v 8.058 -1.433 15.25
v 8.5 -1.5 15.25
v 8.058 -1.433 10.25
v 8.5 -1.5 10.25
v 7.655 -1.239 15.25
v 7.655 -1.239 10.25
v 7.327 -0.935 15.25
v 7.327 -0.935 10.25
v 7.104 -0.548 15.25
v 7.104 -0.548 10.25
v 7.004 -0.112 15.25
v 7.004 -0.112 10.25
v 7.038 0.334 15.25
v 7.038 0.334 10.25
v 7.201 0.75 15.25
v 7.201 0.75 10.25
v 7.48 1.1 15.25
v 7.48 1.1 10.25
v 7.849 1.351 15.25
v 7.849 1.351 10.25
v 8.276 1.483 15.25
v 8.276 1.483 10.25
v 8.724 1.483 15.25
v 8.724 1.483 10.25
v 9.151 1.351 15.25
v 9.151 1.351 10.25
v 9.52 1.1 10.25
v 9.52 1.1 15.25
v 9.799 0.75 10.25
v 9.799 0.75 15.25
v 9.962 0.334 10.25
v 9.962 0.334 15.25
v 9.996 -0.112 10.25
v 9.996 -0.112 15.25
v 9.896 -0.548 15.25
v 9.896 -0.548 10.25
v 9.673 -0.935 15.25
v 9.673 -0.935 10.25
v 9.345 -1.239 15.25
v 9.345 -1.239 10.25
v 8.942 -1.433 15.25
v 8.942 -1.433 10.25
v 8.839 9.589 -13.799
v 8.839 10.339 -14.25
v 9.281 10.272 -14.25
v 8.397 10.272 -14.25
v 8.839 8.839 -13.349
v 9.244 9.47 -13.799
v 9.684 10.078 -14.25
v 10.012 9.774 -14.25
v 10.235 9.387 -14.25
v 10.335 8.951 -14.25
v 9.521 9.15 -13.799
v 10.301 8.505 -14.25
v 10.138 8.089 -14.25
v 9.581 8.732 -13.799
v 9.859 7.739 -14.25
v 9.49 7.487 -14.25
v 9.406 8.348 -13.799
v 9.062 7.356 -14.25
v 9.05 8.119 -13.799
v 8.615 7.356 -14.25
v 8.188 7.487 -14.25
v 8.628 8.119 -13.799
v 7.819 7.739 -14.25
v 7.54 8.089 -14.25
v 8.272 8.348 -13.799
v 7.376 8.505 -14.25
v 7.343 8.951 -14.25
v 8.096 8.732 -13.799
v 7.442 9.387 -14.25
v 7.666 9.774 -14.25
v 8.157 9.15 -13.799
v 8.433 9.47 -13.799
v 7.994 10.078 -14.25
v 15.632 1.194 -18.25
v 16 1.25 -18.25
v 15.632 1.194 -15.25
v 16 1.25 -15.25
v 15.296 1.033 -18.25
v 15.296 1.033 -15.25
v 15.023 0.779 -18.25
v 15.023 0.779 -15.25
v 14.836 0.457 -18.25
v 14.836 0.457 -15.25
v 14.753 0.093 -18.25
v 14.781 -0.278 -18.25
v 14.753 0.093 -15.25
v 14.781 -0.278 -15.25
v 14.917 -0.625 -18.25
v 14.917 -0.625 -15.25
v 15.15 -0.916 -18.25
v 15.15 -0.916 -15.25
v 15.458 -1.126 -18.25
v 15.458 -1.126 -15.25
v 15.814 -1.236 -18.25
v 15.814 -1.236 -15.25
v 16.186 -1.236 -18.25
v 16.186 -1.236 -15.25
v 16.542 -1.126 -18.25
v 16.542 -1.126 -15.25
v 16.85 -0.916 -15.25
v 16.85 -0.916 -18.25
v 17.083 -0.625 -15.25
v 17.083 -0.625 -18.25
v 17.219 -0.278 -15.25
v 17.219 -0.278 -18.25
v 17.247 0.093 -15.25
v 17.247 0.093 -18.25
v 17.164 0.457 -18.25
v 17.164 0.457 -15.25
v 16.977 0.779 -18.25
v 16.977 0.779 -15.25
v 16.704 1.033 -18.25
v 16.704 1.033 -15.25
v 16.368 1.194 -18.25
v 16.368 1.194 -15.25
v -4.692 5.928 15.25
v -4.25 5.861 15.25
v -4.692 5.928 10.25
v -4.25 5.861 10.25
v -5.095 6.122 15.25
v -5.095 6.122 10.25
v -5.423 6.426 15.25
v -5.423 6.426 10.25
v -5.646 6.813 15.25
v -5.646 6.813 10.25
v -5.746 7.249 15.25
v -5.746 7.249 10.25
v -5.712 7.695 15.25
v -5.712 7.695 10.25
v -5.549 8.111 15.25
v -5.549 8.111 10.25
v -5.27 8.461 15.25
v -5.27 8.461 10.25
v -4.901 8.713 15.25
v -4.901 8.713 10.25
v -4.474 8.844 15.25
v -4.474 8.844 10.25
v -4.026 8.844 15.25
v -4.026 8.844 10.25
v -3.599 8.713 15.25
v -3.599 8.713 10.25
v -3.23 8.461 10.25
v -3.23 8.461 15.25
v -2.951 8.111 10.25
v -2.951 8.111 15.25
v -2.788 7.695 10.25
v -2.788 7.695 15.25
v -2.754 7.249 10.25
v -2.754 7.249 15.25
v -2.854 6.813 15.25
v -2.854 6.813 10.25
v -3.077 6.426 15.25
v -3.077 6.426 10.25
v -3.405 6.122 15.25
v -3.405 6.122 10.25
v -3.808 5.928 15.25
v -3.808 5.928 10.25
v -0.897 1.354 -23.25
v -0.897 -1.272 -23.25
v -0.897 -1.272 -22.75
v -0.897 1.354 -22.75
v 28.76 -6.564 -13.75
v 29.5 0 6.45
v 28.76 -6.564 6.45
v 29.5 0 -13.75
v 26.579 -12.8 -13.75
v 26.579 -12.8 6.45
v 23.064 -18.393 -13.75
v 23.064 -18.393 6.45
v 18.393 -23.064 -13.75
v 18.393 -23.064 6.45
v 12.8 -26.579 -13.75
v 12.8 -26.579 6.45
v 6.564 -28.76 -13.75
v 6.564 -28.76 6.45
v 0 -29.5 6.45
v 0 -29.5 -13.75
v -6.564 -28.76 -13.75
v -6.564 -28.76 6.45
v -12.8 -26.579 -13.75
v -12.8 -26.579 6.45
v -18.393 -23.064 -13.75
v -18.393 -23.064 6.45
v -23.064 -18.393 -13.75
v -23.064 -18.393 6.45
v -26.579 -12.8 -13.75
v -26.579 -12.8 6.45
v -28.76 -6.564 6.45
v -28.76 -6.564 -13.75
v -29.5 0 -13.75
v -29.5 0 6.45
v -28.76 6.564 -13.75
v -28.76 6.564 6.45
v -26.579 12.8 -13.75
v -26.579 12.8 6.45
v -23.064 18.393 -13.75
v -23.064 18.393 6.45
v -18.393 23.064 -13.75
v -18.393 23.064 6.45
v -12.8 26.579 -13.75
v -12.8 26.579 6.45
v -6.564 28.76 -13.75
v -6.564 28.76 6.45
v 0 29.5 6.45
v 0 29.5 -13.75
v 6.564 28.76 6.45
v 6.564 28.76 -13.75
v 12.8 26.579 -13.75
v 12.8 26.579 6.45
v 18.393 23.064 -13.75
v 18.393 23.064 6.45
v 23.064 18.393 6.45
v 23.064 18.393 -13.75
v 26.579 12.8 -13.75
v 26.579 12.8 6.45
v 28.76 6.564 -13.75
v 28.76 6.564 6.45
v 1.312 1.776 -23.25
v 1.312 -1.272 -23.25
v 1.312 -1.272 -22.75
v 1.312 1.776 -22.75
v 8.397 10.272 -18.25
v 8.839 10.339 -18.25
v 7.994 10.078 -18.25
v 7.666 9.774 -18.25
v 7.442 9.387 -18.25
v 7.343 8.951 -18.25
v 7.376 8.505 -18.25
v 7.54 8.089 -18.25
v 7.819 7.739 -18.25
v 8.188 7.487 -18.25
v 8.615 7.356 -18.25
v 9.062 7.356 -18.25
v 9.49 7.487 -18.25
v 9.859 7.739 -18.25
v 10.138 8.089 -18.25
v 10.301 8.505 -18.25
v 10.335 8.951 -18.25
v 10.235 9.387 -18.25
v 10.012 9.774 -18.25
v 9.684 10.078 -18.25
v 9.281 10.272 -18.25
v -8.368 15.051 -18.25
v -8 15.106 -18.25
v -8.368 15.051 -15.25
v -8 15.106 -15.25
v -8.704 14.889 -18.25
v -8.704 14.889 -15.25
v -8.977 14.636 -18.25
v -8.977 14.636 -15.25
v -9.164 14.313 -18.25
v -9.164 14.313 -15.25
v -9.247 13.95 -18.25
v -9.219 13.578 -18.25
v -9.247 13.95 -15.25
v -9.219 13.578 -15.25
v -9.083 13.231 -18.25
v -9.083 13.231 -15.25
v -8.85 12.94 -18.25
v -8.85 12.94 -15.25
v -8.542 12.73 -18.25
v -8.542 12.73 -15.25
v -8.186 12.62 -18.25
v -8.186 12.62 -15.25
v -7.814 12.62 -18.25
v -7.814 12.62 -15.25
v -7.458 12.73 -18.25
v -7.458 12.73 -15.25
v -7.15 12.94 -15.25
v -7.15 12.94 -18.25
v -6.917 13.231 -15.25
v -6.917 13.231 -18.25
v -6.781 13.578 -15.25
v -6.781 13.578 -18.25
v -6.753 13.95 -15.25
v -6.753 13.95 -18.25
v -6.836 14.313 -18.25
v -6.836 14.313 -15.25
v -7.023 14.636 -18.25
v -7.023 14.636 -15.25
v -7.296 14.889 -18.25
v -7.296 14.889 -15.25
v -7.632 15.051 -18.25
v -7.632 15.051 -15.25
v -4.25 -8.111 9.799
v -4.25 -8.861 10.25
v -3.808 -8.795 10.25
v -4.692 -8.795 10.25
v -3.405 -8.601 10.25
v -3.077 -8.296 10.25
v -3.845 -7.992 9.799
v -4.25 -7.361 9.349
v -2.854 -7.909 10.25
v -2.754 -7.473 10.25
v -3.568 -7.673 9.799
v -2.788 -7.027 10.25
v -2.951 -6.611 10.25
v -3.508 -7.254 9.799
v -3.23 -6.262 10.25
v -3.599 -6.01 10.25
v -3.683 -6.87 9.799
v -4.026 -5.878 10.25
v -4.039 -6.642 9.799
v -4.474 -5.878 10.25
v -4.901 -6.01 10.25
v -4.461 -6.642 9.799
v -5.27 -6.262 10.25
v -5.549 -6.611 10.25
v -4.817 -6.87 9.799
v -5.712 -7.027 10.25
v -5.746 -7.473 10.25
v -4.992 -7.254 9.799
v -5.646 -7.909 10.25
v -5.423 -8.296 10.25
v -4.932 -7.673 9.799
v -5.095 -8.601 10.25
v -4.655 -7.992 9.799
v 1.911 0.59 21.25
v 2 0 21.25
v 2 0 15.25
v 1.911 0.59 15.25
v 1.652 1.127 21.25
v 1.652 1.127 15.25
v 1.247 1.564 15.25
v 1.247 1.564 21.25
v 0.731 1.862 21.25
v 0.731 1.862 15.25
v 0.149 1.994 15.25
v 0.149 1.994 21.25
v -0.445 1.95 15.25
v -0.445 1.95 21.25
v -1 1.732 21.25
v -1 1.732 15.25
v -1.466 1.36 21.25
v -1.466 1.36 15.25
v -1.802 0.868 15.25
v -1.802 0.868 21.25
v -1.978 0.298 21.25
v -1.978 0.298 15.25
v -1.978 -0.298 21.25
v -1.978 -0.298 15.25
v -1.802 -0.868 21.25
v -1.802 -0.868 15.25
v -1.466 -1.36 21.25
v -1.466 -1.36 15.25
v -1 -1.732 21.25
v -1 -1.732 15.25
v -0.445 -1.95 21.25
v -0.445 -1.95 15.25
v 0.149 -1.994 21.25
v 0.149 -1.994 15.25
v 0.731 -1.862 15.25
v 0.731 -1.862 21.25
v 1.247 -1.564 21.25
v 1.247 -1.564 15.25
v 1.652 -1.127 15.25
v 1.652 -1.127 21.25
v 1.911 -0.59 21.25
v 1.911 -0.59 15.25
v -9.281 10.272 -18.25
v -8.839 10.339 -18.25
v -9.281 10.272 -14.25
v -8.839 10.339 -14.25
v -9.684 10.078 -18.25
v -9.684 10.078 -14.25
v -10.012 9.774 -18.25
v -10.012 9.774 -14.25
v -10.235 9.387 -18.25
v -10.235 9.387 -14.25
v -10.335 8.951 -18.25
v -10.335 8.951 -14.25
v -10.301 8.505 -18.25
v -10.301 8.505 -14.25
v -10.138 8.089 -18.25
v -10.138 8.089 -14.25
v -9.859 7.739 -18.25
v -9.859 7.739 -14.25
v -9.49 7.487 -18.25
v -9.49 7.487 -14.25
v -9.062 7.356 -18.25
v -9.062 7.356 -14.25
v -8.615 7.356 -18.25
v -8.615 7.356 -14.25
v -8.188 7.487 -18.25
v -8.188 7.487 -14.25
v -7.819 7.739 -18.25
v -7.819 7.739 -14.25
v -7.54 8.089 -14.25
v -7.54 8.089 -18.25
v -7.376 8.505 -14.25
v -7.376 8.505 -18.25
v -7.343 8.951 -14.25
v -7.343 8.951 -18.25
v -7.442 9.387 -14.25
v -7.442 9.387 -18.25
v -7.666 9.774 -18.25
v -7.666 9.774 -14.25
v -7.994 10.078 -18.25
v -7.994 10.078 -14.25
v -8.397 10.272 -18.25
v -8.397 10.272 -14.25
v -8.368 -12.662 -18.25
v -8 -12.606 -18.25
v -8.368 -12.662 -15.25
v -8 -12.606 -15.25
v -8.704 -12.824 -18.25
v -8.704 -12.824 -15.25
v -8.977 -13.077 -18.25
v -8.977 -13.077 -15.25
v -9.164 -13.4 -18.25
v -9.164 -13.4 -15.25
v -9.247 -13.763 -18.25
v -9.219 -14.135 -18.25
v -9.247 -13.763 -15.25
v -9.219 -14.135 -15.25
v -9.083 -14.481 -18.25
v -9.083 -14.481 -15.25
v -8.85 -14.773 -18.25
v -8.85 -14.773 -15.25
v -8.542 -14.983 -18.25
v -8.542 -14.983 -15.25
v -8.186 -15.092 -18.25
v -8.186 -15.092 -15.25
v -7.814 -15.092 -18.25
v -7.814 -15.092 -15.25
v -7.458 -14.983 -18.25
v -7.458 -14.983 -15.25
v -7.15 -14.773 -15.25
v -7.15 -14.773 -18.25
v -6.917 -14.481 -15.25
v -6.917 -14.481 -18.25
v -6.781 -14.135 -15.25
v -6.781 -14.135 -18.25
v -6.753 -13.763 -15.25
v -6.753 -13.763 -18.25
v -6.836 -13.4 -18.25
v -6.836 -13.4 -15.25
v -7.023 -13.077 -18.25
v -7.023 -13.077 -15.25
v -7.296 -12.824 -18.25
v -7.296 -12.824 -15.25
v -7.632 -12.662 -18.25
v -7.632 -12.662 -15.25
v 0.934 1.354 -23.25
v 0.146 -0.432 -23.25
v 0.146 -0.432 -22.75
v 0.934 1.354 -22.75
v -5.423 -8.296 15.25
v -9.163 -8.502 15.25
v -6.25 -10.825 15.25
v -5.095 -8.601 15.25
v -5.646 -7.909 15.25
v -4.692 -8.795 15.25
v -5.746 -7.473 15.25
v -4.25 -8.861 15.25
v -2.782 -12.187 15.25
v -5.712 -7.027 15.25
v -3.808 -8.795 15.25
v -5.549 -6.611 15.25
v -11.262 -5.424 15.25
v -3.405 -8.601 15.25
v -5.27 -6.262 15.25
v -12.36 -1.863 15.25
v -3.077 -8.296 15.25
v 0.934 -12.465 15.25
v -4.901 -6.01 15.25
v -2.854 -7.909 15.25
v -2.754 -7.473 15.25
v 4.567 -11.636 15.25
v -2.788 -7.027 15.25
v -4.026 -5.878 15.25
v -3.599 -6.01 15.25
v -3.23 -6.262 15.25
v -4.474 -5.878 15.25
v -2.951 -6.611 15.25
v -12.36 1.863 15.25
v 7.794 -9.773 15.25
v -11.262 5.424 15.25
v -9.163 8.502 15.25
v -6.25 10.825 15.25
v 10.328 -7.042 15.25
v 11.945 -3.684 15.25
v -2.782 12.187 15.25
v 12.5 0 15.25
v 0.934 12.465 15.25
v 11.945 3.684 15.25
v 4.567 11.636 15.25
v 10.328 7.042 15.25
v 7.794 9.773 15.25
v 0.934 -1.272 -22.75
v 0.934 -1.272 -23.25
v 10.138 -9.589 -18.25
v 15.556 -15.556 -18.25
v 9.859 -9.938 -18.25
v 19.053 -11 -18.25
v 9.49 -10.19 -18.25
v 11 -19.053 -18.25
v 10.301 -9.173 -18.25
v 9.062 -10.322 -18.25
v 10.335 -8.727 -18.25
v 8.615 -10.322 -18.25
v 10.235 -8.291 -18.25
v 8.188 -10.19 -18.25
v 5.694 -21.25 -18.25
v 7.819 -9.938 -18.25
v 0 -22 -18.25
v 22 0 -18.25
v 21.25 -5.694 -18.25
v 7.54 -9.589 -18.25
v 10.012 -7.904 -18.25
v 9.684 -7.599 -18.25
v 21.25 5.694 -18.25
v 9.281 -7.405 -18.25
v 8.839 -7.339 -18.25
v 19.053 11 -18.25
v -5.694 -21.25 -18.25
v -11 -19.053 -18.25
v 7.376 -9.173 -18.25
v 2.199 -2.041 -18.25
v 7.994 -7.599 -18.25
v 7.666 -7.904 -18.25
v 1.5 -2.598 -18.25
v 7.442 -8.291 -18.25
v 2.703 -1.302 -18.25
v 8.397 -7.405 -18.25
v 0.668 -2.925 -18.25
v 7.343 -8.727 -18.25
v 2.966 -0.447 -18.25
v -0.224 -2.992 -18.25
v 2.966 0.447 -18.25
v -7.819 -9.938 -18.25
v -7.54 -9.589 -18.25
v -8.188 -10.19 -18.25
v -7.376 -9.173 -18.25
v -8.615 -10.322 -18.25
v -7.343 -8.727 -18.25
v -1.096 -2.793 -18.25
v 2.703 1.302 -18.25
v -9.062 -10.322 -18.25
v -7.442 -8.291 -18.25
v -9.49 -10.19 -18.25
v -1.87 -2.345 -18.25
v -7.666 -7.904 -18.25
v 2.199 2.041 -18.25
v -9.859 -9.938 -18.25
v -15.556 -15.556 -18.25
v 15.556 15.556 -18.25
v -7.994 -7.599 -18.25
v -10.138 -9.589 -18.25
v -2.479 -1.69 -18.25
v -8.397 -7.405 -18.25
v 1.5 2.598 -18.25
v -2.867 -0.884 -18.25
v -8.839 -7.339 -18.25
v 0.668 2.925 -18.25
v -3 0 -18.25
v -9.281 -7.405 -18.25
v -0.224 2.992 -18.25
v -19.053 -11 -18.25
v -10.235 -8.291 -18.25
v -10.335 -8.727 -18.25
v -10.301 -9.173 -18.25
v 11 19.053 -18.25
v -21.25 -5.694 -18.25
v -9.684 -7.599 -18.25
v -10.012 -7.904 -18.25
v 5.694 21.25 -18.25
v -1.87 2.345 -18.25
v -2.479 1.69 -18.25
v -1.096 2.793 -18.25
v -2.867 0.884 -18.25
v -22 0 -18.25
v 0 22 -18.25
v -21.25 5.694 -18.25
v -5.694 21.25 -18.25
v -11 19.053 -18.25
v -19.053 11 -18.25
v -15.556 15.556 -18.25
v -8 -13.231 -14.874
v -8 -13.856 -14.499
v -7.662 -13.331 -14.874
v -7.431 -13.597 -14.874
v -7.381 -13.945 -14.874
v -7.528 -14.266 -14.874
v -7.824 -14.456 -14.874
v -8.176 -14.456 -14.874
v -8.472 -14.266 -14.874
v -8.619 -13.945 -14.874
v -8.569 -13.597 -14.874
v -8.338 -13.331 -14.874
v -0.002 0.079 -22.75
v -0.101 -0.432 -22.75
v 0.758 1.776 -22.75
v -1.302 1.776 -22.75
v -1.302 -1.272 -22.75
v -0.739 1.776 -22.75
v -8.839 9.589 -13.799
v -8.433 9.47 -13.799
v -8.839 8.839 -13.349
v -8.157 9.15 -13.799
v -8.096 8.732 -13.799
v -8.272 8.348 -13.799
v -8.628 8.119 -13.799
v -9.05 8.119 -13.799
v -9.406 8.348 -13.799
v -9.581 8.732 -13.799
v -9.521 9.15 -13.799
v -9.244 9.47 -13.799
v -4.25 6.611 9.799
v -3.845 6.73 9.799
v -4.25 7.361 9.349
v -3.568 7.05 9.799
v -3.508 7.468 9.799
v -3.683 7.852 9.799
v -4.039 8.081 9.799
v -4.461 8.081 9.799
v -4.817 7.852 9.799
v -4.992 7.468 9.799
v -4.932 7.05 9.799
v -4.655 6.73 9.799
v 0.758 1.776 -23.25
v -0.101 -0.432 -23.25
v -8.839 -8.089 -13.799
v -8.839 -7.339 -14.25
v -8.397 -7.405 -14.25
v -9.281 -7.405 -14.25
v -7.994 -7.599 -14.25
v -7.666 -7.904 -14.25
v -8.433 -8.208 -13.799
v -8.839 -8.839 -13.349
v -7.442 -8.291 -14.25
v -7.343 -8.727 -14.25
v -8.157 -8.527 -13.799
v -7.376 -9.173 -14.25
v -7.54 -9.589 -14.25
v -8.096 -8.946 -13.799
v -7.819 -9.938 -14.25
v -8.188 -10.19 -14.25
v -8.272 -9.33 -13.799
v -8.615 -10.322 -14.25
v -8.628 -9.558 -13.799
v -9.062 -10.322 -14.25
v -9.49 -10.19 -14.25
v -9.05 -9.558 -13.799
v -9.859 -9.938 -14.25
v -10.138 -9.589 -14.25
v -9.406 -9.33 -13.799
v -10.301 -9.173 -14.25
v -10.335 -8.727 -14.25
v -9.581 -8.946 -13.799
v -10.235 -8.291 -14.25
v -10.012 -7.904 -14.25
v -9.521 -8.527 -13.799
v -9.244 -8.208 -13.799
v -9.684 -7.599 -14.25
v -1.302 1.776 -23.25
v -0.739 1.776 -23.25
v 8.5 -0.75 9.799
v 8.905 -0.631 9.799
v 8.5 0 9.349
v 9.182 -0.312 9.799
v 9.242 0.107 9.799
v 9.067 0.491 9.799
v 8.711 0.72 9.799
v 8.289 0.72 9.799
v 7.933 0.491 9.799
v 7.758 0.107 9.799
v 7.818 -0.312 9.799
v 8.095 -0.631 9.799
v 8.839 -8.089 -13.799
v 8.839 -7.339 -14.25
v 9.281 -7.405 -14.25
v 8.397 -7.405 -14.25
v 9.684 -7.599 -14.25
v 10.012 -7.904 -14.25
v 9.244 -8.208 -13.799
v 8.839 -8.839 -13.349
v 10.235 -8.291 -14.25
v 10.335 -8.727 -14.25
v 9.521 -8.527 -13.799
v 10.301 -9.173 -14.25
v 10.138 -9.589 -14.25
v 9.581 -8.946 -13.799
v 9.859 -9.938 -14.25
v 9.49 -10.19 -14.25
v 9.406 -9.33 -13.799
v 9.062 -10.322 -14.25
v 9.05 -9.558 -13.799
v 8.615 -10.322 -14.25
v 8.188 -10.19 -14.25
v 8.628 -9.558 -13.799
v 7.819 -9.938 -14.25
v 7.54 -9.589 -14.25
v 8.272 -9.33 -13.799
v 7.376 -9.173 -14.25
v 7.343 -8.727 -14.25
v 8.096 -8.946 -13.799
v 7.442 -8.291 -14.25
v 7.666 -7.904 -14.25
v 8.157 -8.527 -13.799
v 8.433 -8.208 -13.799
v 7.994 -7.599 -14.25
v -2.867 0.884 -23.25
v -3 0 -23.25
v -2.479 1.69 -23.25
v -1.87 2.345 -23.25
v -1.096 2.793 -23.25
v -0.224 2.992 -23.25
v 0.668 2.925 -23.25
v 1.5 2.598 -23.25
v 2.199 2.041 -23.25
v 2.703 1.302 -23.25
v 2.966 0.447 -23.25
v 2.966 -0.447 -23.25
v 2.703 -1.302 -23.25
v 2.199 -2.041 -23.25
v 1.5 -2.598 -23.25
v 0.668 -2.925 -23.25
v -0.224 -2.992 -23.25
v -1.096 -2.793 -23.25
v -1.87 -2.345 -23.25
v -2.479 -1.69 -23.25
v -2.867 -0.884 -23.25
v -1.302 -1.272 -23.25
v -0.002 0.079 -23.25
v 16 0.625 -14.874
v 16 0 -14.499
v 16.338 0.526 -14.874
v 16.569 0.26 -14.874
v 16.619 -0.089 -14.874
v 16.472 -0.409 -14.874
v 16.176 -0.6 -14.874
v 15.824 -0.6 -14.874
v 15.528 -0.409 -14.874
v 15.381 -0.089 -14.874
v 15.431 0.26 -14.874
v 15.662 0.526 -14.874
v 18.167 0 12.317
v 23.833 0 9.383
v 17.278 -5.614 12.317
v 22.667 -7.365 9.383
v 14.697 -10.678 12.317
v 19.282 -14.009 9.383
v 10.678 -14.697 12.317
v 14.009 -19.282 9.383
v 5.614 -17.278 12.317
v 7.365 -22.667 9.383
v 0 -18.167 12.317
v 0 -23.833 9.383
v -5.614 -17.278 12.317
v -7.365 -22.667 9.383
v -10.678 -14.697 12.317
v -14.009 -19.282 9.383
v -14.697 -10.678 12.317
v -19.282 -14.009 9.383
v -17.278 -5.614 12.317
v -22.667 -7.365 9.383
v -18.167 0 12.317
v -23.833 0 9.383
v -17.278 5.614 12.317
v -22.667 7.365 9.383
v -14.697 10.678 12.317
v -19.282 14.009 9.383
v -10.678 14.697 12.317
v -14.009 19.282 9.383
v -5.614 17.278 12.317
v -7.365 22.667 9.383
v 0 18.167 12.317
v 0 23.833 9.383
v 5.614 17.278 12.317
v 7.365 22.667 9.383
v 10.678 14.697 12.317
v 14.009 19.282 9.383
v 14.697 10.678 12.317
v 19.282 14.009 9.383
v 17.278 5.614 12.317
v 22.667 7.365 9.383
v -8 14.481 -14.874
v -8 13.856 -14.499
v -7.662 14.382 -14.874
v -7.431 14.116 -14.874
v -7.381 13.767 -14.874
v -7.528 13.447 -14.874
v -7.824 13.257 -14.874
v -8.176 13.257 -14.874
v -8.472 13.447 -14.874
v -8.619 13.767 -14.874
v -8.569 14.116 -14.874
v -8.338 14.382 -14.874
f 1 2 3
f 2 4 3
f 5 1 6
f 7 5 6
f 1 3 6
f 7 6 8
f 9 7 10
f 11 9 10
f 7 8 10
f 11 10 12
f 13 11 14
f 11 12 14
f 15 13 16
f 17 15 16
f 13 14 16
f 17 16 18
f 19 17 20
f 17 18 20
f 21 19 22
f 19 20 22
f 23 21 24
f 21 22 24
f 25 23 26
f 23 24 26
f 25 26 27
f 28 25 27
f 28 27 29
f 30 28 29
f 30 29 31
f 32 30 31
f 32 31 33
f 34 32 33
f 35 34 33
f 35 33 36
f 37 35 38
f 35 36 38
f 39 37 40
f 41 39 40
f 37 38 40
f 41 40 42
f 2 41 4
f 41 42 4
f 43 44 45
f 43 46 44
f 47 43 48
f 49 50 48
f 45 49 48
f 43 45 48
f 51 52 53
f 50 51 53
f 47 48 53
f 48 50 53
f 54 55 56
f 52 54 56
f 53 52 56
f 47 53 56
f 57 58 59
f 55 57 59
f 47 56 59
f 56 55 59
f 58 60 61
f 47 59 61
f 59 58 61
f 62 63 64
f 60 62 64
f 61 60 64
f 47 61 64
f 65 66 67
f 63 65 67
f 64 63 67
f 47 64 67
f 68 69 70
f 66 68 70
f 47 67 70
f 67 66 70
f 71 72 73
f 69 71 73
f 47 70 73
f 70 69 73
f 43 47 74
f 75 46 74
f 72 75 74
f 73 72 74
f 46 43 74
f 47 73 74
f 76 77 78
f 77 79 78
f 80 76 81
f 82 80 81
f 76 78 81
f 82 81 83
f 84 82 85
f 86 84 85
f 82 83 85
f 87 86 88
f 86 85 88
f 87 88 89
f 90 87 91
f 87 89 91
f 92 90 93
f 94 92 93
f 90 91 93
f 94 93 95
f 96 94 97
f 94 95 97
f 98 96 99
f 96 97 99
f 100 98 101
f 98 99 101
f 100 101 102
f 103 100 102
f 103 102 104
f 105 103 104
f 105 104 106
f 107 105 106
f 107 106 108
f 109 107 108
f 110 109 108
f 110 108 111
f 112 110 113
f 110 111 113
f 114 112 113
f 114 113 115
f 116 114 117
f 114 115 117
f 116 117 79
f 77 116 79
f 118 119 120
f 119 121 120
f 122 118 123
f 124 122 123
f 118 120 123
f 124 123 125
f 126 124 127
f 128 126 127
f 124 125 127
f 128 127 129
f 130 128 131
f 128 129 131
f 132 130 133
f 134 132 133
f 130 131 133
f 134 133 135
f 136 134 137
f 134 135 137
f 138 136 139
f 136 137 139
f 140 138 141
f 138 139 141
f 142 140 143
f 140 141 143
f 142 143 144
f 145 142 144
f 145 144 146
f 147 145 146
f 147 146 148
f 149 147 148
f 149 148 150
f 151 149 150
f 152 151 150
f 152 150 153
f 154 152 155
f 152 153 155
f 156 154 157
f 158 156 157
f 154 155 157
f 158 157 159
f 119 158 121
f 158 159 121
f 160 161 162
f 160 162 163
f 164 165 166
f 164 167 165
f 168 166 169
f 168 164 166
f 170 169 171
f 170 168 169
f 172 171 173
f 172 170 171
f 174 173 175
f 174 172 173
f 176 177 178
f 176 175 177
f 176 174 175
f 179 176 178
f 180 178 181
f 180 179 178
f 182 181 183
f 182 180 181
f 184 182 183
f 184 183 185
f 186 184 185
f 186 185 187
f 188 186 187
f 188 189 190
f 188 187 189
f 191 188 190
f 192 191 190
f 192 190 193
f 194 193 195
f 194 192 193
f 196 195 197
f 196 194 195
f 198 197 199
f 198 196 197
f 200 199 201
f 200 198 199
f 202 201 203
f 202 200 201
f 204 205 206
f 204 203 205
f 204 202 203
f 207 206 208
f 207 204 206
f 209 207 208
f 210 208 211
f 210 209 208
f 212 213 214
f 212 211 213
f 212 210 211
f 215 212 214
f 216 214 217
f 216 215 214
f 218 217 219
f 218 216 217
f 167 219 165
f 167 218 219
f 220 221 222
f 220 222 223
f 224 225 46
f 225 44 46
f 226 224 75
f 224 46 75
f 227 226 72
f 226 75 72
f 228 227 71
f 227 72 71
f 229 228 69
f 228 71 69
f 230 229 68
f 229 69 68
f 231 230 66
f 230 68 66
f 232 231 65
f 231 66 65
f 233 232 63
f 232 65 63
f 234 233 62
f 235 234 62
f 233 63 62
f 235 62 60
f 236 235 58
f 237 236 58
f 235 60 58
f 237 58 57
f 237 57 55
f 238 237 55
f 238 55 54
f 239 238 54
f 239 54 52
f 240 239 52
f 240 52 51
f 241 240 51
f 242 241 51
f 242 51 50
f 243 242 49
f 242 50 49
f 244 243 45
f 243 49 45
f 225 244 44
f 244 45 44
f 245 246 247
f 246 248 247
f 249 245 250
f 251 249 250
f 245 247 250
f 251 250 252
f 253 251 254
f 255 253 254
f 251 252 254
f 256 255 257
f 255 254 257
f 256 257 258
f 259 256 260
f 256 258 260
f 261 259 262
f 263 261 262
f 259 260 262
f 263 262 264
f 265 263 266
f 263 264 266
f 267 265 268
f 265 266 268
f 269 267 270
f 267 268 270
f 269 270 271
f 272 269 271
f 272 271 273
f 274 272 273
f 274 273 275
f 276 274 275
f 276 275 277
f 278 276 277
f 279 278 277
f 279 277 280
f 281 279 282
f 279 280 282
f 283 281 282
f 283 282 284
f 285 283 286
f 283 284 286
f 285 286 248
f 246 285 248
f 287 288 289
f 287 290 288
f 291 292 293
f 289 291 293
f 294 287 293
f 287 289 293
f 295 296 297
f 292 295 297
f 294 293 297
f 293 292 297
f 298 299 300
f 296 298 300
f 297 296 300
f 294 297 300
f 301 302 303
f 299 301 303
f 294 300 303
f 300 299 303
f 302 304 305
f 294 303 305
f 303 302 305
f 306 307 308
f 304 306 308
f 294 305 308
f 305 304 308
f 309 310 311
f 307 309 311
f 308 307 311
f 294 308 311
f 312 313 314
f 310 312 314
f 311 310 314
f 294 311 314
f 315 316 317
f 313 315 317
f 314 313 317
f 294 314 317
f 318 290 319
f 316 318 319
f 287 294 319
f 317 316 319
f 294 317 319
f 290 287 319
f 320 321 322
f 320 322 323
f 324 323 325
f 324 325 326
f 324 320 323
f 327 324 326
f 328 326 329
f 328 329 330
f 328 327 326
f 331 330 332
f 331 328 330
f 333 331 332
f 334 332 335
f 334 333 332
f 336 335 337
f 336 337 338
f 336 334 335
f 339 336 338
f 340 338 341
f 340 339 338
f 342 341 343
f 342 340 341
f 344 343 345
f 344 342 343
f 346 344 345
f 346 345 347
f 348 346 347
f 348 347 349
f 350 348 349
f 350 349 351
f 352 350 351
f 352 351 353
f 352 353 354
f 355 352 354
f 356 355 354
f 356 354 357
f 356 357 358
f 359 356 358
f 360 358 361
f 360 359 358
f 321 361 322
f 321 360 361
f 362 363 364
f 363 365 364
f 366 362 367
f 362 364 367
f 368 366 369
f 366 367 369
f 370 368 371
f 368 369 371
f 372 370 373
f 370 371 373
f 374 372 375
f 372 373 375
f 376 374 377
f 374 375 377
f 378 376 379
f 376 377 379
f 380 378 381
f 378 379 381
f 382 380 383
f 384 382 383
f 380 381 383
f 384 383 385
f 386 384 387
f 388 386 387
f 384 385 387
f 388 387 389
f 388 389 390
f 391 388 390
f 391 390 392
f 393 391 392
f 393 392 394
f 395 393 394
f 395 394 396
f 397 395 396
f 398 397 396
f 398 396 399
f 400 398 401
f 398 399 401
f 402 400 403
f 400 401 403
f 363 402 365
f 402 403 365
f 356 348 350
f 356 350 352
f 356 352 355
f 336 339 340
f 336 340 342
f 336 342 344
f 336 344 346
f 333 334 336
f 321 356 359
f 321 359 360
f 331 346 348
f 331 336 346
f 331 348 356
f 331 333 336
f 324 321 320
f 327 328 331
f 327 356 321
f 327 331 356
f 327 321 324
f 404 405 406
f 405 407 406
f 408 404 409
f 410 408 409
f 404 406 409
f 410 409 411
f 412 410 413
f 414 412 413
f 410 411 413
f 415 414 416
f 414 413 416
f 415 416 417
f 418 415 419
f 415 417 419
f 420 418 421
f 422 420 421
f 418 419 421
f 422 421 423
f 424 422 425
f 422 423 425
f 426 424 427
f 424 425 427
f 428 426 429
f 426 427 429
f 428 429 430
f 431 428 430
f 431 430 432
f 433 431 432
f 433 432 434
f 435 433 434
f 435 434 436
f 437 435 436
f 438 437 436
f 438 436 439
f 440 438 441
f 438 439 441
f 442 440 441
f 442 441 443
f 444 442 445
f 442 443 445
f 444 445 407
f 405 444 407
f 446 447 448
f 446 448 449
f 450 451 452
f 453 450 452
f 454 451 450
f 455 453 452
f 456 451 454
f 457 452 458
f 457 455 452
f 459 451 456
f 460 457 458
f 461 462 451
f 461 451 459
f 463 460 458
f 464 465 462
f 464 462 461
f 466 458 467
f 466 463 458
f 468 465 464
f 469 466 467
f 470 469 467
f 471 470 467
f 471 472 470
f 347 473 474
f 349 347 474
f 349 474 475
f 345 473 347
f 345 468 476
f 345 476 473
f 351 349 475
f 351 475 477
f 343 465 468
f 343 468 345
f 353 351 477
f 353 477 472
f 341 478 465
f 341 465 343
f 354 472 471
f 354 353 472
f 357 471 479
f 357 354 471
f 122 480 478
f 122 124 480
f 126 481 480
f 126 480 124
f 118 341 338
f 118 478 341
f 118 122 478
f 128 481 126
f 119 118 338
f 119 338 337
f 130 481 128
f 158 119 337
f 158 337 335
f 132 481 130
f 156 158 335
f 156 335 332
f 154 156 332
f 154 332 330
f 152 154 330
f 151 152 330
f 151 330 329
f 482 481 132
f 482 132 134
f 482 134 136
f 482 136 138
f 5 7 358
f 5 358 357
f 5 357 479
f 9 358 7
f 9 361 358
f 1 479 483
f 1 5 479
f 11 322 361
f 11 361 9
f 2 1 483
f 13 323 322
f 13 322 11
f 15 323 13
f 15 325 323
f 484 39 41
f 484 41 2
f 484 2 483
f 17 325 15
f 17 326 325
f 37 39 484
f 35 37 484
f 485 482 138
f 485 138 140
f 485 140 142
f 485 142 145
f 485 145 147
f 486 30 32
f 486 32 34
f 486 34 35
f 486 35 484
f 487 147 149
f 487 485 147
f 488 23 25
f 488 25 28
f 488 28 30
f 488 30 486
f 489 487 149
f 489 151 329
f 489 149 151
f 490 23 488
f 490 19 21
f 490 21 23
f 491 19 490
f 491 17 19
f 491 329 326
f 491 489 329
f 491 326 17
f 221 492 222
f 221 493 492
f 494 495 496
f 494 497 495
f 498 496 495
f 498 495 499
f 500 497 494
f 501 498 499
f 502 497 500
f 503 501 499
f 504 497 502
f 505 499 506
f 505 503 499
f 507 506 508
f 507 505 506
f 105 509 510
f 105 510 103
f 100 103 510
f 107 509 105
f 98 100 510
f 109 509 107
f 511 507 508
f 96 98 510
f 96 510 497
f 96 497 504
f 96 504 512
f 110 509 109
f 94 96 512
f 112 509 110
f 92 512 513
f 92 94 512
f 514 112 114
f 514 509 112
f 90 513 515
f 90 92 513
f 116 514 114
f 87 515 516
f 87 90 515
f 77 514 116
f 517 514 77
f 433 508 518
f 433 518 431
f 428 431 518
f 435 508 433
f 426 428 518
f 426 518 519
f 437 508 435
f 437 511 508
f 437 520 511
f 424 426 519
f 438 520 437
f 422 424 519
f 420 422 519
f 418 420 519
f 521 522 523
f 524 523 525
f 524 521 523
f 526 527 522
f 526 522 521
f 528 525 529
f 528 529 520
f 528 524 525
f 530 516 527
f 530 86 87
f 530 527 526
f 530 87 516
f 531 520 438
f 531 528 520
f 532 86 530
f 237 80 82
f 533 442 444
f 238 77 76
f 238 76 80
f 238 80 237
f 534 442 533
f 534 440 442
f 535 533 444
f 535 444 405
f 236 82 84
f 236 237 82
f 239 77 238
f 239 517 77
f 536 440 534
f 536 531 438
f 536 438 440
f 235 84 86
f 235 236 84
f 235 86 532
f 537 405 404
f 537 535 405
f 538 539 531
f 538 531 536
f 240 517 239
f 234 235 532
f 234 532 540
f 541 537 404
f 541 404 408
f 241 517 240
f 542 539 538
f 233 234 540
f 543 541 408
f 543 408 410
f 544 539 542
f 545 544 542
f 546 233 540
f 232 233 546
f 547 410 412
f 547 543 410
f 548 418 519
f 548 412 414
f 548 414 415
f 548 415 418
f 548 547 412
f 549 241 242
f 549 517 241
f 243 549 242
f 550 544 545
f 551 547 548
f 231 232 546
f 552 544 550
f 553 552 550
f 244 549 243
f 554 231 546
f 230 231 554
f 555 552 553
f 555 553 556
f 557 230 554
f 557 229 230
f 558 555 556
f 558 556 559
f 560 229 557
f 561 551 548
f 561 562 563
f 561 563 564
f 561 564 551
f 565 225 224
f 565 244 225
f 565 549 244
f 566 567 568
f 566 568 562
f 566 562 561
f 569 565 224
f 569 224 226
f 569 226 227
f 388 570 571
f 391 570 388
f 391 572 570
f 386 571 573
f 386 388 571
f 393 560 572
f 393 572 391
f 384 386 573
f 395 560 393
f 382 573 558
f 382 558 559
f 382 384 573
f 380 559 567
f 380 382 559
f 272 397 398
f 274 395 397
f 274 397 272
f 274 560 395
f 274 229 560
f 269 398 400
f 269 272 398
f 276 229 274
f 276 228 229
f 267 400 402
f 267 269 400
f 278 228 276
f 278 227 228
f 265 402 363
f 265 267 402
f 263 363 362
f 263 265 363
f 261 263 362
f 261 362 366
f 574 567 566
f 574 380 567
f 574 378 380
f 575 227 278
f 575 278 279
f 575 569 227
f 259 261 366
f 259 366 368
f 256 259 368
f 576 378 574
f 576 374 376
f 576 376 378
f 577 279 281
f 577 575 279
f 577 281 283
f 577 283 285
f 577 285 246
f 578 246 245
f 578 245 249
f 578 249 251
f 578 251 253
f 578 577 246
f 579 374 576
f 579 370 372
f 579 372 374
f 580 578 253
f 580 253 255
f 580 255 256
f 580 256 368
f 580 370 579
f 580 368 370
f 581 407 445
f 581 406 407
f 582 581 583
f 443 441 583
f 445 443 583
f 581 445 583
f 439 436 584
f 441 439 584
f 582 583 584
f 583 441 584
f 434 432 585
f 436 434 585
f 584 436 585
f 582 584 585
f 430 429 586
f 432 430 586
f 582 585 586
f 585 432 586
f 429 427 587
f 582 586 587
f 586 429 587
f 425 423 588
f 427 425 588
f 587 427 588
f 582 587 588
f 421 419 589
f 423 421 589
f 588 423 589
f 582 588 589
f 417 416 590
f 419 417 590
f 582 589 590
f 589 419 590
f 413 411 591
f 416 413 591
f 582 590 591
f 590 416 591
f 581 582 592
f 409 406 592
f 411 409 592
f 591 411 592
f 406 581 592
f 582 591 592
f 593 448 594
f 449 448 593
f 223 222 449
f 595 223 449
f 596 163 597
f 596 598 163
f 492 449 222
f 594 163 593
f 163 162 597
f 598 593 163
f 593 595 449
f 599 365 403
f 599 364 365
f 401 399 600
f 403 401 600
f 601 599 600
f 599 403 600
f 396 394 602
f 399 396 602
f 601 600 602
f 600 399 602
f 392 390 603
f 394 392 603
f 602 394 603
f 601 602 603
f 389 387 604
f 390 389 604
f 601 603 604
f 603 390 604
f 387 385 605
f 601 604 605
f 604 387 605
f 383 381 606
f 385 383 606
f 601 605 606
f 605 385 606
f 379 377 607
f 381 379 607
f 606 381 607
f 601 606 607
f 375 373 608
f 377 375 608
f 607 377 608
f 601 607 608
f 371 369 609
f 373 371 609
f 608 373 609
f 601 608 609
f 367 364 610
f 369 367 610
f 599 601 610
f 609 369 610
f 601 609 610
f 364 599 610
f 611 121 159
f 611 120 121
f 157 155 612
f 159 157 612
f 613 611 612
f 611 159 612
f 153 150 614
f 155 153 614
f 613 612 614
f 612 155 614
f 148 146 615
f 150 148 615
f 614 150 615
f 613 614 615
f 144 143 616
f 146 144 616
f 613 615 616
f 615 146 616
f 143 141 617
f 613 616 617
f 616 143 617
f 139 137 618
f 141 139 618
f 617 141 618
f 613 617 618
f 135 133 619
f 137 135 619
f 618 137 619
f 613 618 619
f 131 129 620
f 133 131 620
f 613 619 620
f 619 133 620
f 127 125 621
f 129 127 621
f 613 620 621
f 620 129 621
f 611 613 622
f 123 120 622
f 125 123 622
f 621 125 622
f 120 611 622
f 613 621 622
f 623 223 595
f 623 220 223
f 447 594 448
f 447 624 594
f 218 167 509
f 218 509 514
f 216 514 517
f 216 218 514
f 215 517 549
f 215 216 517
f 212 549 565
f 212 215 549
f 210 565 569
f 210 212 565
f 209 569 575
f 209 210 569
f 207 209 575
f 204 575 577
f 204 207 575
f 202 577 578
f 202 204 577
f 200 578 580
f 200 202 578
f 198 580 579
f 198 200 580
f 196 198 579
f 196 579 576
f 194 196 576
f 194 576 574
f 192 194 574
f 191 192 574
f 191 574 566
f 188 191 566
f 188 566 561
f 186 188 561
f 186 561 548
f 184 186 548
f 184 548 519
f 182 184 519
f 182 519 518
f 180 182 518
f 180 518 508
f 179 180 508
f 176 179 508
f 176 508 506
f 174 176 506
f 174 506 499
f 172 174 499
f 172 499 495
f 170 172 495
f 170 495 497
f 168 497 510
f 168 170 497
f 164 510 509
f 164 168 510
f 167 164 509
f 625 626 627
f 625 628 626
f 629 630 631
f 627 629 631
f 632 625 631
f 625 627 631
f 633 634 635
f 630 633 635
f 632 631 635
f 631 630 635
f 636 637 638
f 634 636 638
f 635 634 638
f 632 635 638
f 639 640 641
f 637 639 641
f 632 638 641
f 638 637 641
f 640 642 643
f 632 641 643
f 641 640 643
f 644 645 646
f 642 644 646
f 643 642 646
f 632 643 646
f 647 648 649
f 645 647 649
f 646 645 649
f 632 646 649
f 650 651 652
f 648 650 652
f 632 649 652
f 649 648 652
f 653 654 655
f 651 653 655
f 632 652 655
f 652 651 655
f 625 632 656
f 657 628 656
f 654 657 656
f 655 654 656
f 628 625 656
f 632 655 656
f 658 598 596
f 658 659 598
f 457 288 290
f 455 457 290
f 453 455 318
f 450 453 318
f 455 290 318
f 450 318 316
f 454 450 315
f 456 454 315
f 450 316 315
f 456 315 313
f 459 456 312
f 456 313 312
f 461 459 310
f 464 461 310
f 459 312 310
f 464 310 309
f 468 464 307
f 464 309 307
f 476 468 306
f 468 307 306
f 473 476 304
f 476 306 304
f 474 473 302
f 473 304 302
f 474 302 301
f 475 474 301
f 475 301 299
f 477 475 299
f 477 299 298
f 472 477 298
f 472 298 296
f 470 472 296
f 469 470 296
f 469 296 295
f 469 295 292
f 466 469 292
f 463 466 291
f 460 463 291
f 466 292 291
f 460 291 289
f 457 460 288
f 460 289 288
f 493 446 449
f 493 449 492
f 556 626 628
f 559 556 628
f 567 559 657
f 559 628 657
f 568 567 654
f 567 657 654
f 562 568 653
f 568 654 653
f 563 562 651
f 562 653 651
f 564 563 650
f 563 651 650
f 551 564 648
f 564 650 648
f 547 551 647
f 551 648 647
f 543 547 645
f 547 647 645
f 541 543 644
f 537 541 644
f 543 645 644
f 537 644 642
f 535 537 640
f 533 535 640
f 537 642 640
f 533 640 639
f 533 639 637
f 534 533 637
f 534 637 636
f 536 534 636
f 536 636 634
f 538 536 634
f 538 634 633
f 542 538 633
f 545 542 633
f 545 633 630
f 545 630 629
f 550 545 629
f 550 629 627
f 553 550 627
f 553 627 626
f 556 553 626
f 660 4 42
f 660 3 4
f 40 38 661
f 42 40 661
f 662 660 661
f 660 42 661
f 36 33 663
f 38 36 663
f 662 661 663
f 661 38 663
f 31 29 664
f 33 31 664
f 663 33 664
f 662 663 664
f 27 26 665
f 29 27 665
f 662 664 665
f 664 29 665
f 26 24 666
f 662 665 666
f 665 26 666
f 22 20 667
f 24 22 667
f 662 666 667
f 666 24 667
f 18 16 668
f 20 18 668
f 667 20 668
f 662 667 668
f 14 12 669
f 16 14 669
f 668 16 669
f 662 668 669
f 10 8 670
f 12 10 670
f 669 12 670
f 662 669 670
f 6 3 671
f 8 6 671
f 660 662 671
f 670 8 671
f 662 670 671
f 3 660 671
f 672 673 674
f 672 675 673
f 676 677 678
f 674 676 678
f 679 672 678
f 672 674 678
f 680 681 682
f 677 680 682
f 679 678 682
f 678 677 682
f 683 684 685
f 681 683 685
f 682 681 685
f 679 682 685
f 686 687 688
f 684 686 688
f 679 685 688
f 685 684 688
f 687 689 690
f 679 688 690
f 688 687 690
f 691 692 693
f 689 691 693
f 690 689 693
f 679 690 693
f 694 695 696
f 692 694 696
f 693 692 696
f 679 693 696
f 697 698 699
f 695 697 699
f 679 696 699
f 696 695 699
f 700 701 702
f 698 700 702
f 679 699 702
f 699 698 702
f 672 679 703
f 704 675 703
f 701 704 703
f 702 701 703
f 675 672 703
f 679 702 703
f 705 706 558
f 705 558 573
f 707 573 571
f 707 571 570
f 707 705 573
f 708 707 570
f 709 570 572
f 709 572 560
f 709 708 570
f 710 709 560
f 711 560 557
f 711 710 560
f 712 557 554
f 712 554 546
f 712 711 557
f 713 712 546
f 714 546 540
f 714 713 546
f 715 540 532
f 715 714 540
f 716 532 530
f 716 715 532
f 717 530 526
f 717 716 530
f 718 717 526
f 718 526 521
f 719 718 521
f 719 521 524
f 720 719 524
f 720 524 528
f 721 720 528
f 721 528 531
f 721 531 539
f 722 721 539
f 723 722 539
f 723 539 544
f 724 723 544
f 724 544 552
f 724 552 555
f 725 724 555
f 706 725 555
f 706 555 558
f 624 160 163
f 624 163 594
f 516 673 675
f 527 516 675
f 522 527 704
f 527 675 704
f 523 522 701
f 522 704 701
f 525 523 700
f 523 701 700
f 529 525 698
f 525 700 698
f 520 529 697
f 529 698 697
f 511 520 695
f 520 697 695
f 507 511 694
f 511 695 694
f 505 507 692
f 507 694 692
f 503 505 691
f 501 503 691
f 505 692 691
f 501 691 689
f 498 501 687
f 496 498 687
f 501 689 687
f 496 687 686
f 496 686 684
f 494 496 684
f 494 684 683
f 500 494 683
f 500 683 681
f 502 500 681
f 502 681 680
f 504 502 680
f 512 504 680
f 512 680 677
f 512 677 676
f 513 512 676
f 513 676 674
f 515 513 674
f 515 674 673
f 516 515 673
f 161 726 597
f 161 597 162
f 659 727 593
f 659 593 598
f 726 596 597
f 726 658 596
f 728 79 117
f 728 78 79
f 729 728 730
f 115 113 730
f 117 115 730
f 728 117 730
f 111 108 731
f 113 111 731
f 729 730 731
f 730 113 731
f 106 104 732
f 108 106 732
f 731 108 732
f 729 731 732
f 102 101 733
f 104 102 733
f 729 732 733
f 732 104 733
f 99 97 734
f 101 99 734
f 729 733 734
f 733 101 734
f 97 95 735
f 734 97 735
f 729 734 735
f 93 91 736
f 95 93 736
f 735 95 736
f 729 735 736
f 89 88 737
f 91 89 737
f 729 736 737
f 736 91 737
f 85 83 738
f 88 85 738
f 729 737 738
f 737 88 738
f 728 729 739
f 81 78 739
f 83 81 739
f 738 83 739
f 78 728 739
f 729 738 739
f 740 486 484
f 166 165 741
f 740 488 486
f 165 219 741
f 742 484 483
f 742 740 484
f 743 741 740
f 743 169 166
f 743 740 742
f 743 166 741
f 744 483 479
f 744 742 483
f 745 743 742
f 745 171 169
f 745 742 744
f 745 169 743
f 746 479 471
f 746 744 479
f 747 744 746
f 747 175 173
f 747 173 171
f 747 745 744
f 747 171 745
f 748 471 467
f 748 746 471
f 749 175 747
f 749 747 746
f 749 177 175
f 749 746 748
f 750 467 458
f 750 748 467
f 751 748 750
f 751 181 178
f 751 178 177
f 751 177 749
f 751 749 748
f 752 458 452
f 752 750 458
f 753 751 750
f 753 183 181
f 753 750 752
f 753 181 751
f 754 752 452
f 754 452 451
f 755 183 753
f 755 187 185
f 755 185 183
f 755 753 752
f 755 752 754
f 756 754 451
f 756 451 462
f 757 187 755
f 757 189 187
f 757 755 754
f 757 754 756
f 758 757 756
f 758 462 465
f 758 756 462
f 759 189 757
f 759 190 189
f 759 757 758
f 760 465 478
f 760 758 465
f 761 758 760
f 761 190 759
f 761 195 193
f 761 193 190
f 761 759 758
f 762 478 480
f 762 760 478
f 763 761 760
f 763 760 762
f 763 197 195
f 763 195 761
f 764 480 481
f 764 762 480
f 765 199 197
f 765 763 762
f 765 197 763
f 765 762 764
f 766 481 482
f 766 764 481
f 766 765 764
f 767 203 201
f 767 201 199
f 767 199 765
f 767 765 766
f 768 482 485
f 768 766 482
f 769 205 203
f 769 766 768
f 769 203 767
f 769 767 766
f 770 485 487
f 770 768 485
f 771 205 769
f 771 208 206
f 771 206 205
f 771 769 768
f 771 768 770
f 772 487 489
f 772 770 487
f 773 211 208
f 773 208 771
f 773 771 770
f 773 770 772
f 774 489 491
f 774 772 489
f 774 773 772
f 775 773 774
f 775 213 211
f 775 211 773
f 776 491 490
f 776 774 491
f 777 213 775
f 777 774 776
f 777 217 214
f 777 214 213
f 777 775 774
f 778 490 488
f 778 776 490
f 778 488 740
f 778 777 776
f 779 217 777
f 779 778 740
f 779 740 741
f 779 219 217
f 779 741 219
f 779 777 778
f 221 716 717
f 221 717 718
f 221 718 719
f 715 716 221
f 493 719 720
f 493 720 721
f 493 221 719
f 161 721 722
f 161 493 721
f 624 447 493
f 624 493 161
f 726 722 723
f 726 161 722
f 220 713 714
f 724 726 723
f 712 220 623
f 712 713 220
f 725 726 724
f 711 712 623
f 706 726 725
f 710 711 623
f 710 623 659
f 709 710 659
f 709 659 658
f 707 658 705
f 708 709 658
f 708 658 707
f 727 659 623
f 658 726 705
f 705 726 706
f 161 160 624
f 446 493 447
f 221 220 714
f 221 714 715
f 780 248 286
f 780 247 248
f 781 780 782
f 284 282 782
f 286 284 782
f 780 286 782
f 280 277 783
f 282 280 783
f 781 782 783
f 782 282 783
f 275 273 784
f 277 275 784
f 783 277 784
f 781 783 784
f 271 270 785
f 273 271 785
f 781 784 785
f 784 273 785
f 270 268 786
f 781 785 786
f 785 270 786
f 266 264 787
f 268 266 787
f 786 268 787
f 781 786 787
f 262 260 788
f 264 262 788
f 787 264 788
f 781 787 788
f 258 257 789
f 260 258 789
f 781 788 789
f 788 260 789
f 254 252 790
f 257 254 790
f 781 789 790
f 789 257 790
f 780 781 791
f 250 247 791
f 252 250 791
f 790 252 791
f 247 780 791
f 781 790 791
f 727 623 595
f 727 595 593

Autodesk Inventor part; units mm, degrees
ref_plane "YZ Plane" through (0, 0, 0) normal (1, 0, 0) x (0, 1, 0)
ref_plane "XZ Plane" through (0, 0, 0) normal (0, 1, 0) x (-1, 0, 0)
ref_plane "XY Plane" through (0, 0, 0) normal (0, 0, 1) x (1, 0, 0)
sketch "Sketch1" plane through (0, 0, 0) normal (0, 0, 1) x (1, 0, 0)
  circle A0 centre (0, 0) radius 29.5
  circle A1 centre (0, 0) radius 16 construction
  circle A2 centre (0, 0) radius 12.5 construction
  circle A3 centre (0, 0) radius 8.5
  line L0 (0, 0) -> (17.0589, 17.0589) construction
  line L1 (-45.7937, 0) -> (68.262, 0) projected
  line L2 (0, 0) -> (-17.0589, 17.0589) construction
  line L3 (0, 0) -> (-17.0589, -17.0589) construction
  line L4 (0, 0) -> (17.0589, -17.0589) construction
  line L5 (0, 0) -> (51.9684, 0) construction
  line L6 (0, 0) -> (-25.9842, 45.0059) construction
  line L7 (0, 0) -> (-25.9842, -45.0059) construction
  circle A4 centre (0, 0) radius 3 construction
  circle A5 centre (0, 0) radius 2 construction
  point P0 (8.5, 0)
  point P1 (-4.25, 7.3612)
  point P2 (-4.25, -7.3612)
  point P3 (8.8388, 8.8388)
  point P4 (-8.8388, -8.8388)
  point P5 (-8.8388, 8.8388)
  point P6 (8.8388, -8.8388)
  point P7 (16, 0)
  point P8 (-8, -13.8564)
  point P9 (-8, 13.8564)
  dimension "d0" = 59
  dimension "d1" = 32
  dimension "d2" = 25
  dimension "d3" = 17
  dimension "d4" = 45
  dimension "d8" = 360
  dimension "d12" = 360
  dimension "d14" = 6
  dimension "d15" = 4
sketch "Sketch2" plane through (0, 0, 0) normal (0, 0, 1) x (1, 0, 0)
  circle A0 centre (0, 0) radius 29.5 projected
extrude "Extrusion1" add sketch "Sketch2" along normal mid plane 42.5
sketch "Sketch3" plane through (0, 0, 21.25) normal (0, 0, 1) x (1, 0, 0)
  circle A0 centre (0, 0) radius 2 projected
  circle A1 centre (0, 0) radius 29.5 projected
extrude "Extrusion2" cut sketch "Sketch3" against normal blind 6
sketch "Sketch4" plane through (0, 0, -21.25) normal (0, 0, -1) x (-1, 0, 0)
  circle A0 centre (0, 0) radius 3 projected
  circle A1 centre (0, 0) radius 29.5 projected
extrude "Extrusion3" cut sketch "Sketch4" against normal blind 3
sketch "Sketch5" plane through (0, 0, 15.25) normal (0, 0, 1) x (1, 0, 0)
  circle A0 centre (0, 0) radius 8.5 projected
  circle A1 centre (0, 0) radius 12.5
  point P0 (-4.25, 7.3612)
  point P1 (8.5, 0)
  point P2 (-4.25, -7.3612)
  dimension "d29" = 25
hole "Hole1" at (-4.25, 7.3612, 15.25) at (8.5, 0, 15.25) at (-4.25, -7.3612, 15.25) direction (0, 0, -1) diameter 3 depth 5 tip angle 118
chamfer "Chamfer1" distance 8.8 distance2 17 1 edges at (-29.5, 0, 15.25) measured on face at (29.4043, -2.3738, -7.0833)
sketch "Sketch6" plane through (0, 0, -21.25) normal (0, 0, -1) x (-1, 0, 0)
  circle A0 centre (0, 0) radius 3 projected
extrude "Magnet" add sketch "Sketch6" along normal blind 2
chamfer "Chamfer2" distance 4.5 distance2 7.5 1 edges at (-29.5, 0, -18.25) measured on face at (29.118, -4.7321, -10.0167)
sketch "Sketch7" plane through (0, 0, -18.25) normal (0, 0, -1) x (-1, 0, 0)
  circle A0 centre (0, 0) radius 8.5 projected
  circle A1 centre (0, 0) radius 12.5 projected
  point P0 (8.8388, 8.8388)
  point P1 (-8.8388, 8.8388)
  point P2 (-8.8388, -8.8388)
  point P3 (8.8388, -8.8388)
  point P4 (8, 13.8564)
  point P5 (8, -13.8564)
  point P6 (-16, 0)
hole "Hole2" at (8.8388, 8.8388, -18.25) at (-8.8388, 8.8388, -18.25) at (-8.8388, -8.8388, -18.25) at (8.8388, -8.8388, -18.25) direction (0, 0, 1) diameter 3 depth 4 tip angle 118
hole "Hole3" at (-8, 13.8564, -18.25) at (16, 0, -18.25) at (-8, -13.8564, -18.25) direction (0, 0, 1) diameter 2.5 depth 3 tip angle 118
sketch "Sketch8" plane through (0, 0, -23.25) normal (0, 0, -1) x (-1, 0, 0)
  line L0 (-1.6203, 1.7761) -> (1.6105, 1.7761) construction
  line L1 (1.6105, 1.7761) -> (1.6105, -1.2719) construction
  line L2 (1.6105, -1.2719) -> (-1.6203, -1.2719) construction
  line L3 (-1.6203, -1.2719) -> (-1.6203, 1.7761) construction
  line L4 (1.3017, -1.2719) -> (0.8967, -1.2719)
  line L5 (0.8967, -1.2719) -> (0.8967, 1.3537)
  line L6 (0.8967, 1.3537) -> (0.1013, -0.4321)
  line L7 (0.1013, -0.4321) -> (-0.1457, -0.4321)
  line L8 (-0.1457, -0.4321) -> (-0.9336, 1.3537)
  line L9 (-0.9336, 1.3537) -> (-0.9336, -1.2719)
  line L10 (-0.9336, -1.2719) -> (-1.3115, -1.2719)
  line L11 (-1.3115, -1.2719) -> (-1.3115, 1.7761)
  line L12 (-1.3115, 1.7761) -> (-0.7583, 1.7761)
  line L13 (-0.7583, 1.7761) -> (0.0025, 0.0792)
  line L14 (0.0025, 0.0792) -> (0.7386, 1.7761)
  line L15 (0.7386, 1.7761) -> (1.3017, 1.7761)
  line L16 (1.3017, 1.7761) -> (1.3017, -1.2719)
  point P0 (0, 0)
extrude "Extrusion5" cut sketch "Sketch8" against normal blind 0.5
sketch "Sketch9" plane through (0, 0, -18.25) normal (0, 0, -1) x (-1, 0, 0)
  circle A0 centre (-8.8388, 8.8388) radius 1.5 projected
  circle A1 centre (8.8388, 8.8388) radius 1.5 projected
  circle A2 centre (8.8388, -8.8388) radius 1.5 projected
  circle A3 centre (-8.8388, -8.8388) radius 1.5 projected
  circle A4 centre (0, 0) radius 3 projected
  circle A5 centre (0, 0) radius 29.5 projected
  circle A6 centre (-16, 0) radius 1.25 projected
  circle A7 centre (8, 13.8564) radius 1.25 projected
  circle A8 centre (8, -13.8564) radius 1.25 projected
equation "\"d22\" = M3"
equation "\"d27\" = D5_M3"
equation "\"d38\" = M3"
equation "\"M3\" = 3"
equation "\"D5_M3\" = 5"
properties part number "3phaseMotor"
